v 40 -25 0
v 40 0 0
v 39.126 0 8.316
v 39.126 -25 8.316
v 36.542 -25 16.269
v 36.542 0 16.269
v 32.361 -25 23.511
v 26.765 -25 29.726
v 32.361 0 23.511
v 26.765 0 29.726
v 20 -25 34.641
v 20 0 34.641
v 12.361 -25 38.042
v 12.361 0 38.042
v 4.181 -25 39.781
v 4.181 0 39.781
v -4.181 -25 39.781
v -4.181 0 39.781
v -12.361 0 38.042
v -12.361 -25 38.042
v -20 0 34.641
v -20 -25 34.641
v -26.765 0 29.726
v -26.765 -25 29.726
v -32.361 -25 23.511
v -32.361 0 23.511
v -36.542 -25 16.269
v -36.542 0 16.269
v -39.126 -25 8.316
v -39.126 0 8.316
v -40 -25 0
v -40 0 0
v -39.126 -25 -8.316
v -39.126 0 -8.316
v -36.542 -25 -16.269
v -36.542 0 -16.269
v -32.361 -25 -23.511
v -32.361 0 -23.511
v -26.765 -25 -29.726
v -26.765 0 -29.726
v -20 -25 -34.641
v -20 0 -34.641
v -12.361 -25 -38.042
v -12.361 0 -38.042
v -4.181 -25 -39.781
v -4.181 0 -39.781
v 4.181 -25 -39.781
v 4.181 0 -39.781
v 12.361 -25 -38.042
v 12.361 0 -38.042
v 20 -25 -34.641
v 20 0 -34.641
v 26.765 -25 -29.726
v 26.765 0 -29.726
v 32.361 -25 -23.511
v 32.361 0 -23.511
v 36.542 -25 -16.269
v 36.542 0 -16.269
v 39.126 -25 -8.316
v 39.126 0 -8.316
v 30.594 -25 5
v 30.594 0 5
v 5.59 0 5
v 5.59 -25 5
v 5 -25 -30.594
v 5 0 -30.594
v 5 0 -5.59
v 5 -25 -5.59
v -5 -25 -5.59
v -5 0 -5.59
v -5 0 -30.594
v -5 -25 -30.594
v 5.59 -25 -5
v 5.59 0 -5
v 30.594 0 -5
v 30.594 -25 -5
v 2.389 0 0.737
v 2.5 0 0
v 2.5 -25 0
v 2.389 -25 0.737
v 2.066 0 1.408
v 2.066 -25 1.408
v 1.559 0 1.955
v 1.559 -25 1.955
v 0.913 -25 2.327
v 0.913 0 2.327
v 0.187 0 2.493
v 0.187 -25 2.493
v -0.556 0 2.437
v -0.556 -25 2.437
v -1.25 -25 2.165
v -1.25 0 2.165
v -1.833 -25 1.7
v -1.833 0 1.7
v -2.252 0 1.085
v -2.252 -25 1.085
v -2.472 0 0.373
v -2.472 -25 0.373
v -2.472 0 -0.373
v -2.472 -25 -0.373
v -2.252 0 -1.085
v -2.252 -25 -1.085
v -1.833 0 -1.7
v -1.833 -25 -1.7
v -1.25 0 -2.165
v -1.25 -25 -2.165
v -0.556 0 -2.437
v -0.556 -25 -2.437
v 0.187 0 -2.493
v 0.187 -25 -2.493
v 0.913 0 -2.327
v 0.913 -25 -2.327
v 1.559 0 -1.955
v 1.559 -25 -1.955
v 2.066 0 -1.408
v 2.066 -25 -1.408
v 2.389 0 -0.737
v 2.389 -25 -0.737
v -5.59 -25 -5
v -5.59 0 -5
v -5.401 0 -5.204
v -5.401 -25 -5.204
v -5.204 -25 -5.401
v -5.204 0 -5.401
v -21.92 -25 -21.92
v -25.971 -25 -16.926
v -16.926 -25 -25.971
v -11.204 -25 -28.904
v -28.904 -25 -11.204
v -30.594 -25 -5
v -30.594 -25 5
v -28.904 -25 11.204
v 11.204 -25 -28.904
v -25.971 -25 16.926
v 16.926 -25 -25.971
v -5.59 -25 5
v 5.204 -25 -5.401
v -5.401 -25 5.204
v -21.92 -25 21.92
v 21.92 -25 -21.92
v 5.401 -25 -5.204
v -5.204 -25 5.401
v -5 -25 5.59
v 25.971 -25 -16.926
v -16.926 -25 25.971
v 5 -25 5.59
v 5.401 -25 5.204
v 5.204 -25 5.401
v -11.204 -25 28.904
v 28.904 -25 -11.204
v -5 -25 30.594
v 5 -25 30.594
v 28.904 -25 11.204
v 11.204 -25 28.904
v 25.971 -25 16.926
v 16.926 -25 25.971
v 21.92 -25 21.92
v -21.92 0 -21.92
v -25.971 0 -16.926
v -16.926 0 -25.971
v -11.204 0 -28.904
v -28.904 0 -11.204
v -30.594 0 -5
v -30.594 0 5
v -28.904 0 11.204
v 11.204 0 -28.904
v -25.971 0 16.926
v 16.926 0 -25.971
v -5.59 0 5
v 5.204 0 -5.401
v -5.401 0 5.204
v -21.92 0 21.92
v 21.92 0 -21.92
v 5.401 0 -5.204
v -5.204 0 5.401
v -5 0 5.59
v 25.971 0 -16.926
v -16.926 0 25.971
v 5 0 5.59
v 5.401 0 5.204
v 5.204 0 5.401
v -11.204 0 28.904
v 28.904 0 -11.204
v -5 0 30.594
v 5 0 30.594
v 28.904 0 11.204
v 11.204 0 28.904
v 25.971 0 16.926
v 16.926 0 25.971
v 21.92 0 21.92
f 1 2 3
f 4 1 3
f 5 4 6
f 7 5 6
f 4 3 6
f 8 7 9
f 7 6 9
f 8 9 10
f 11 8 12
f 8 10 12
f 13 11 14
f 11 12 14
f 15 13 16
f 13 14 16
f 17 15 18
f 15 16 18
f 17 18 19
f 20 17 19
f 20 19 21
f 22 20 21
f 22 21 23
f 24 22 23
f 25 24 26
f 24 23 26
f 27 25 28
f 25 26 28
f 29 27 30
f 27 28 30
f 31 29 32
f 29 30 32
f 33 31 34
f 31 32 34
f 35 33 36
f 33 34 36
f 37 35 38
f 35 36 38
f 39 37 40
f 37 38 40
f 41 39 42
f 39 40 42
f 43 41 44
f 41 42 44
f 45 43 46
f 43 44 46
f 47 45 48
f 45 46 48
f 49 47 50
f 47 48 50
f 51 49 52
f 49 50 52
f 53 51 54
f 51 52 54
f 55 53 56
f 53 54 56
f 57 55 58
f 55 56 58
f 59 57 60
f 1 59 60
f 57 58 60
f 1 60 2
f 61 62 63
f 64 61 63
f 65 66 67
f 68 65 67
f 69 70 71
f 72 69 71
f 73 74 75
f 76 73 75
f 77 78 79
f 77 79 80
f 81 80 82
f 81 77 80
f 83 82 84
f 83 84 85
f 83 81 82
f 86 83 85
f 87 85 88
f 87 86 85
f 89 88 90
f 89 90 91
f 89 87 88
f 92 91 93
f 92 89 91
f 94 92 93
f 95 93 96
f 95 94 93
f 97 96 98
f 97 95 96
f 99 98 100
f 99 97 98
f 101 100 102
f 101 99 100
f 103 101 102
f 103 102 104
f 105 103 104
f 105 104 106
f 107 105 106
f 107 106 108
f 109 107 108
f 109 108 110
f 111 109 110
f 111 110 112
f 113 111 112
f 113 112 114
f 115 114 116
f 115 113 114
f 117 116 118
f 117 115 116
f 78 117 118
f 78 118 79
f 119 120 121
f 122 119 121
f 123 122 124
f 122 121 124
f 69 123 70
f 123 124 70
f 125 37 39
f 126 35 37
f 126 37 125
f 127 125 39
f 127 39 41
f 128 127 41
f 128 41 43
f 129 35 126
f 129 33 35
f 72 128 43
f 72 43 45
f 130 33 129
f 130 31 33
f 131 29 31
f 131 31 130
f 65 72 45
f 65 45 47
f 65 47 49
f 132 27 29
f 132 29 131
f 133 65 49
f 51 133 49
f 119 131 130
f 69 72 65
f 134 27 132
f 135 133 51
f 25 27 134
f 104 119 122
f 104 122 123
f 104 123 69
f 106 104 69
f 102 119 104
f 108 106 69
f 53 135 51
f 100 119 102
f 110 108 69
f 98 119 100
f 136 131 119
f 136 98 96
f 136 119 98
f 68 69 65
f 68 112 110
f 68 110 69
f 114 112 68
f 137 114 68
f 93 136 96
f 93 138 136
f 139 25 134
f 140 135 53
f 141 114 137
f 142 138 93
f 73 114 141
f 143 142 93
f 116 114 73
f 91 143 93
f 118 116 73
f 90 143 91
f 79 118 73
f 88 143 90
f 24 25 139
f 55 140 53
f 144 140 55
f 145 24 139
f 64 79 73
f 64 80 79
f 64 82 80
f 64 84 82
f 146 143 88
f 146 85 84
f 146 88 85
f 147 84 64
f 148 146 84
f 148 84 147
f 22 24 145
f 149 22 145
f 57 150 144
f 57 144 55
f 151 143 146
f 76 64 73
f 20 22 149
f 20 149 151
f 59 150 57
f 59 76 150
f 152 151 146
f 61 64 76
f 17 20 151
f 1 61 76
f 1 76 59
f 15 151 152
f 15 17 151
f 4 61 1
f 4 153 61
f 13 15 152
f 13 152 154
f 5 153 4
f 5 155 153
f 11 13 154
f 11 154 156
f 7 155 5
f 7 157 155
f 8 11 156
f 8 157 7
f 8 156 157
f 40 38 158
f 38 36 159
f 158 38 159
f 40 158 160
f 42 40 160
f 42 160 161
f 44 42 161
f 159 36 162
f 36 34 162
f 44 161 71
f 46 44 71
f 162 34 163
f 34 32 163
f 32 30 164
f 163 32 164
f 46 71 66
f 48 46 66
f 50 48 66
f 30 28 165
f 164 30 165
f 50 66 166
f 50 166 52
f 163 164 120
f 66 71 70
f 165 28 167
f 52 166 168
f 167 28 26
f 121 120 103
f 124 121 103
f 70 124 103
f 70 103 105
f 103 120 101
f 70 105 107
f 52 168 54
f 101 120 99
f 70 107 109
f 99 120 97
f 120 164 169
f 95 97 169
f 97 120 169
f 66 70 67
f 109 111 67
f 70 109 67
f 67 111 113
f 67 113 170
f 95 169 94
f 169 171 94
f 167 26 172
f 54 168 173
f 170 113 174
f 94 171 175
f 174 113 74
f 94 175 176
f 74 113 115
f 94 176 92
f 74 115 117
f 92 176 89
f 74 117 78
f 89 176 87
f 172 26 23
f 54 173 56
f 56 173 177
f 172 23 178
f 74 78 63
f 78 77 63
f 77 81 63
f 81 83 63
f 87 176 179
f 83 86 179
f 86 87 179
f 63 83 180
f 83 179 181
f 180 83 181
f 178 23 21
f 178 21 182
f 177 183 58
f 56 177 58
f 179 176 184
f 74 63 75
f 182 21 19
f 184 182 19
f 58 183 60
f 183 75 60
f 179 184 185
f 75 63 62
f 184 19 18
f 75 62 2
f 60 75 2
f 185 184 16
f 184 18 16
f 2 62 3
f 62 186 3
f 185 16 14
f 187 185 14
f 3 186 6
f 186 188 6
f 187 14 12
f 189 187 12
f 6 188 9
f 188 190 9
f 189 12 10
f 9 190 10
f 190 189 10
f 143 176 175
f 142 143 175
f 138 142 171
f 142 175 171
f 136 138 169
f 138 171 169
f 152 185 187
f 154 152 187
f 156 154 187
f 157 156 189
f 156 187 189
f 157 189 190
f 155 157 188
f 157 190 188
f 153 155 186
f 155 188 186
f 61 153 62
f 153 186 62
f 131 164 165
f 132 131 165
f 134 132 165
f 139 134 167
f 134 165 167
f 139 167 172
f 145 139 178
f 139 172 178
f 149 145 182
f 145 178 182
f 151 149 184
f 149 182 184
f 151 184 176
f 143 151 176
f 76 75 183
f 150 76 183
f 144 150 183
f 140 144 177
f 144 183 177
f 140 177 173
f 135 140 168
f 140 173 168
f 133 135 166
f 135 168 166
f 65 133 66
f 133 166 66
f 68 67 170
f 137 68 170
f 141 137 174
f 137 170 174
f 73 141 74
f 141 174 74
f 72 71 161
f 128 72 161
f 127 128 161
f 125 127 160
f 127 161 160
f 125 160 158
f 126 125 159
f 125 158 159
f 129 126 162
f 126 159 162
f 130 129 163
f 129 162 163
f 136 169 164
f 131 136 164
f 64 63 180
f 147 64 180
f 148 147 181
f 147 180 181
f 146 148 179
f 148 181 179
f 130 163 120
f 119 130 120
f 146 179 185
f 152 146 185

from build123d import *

# Parameters (mm, degrees)
F0_R     = 40
F0_R_2   = 2.5
F1_DEPTH = 25


with BuildPart() as f1:
    # F0 (on Front) → F1 (new body)
    with BuildSketch(Plane.XZ):
        Circle(F0_R)
        with BuildLine():
            ThreePointArc((-5, -30.594117), (-21.92031, -21.92031), (-30.594117, -5))
            Line((-30.594117, -5), (-5.59017, -5))
            ThreePointArc((-5.59017, -5), (-5.303301, -5.303301), (-5, -5.59017))
            Line((-5, -5.59017), (-5, -30.594117))
        make_face(mode=Mode.SUBTRACT)
        with BuildLine():
            Line((5, -30.594117), (5, -5.59017))
            ThreePointArc((5, -5.59017), (5.303301, -5.303301), (5.59017, -5))
            Line((5.59017, -5), (30.594117, -5))
            ThreePointArc((30.594117, -5), (21.92031, -21.92031), (5, -30.594117))
        make_face(mode=Mode.SUBTRACT)
        with BuildLine():
            Line((-5, 30.594117), (-5, 5.59017))
            ThreePointArc((-5, 5.59017), (-5.303301, 5.303301), (-5.59017, 5))
            Line((-5.59017, 5), (-30.594117, 5))
            ThreePointArc((-30.594117, 5), (-21.92031, 21.92031), (-5, 30.594117))
        make_face(mode=Mode.SUBTRACT)
        Circle(F0_R_2, mode=Mode.SUBTRACT)
        with BuildLine():
            ThreePointArc((5.59017, 5), (5.303301, 5.303301), (5, 5.59017))
            Line((5, 5.59017), (5, 30.594117))
            ThreePointArc((5, 30.594117), (21.92031, 21.92031), (30.594117, 5))
            Line((30.594117, 5), (5.59017, 5))
        make_face(mode=Mode.SUBTRACT)
    extrude(amount=F1_DEPTH)


solid = f1.part
